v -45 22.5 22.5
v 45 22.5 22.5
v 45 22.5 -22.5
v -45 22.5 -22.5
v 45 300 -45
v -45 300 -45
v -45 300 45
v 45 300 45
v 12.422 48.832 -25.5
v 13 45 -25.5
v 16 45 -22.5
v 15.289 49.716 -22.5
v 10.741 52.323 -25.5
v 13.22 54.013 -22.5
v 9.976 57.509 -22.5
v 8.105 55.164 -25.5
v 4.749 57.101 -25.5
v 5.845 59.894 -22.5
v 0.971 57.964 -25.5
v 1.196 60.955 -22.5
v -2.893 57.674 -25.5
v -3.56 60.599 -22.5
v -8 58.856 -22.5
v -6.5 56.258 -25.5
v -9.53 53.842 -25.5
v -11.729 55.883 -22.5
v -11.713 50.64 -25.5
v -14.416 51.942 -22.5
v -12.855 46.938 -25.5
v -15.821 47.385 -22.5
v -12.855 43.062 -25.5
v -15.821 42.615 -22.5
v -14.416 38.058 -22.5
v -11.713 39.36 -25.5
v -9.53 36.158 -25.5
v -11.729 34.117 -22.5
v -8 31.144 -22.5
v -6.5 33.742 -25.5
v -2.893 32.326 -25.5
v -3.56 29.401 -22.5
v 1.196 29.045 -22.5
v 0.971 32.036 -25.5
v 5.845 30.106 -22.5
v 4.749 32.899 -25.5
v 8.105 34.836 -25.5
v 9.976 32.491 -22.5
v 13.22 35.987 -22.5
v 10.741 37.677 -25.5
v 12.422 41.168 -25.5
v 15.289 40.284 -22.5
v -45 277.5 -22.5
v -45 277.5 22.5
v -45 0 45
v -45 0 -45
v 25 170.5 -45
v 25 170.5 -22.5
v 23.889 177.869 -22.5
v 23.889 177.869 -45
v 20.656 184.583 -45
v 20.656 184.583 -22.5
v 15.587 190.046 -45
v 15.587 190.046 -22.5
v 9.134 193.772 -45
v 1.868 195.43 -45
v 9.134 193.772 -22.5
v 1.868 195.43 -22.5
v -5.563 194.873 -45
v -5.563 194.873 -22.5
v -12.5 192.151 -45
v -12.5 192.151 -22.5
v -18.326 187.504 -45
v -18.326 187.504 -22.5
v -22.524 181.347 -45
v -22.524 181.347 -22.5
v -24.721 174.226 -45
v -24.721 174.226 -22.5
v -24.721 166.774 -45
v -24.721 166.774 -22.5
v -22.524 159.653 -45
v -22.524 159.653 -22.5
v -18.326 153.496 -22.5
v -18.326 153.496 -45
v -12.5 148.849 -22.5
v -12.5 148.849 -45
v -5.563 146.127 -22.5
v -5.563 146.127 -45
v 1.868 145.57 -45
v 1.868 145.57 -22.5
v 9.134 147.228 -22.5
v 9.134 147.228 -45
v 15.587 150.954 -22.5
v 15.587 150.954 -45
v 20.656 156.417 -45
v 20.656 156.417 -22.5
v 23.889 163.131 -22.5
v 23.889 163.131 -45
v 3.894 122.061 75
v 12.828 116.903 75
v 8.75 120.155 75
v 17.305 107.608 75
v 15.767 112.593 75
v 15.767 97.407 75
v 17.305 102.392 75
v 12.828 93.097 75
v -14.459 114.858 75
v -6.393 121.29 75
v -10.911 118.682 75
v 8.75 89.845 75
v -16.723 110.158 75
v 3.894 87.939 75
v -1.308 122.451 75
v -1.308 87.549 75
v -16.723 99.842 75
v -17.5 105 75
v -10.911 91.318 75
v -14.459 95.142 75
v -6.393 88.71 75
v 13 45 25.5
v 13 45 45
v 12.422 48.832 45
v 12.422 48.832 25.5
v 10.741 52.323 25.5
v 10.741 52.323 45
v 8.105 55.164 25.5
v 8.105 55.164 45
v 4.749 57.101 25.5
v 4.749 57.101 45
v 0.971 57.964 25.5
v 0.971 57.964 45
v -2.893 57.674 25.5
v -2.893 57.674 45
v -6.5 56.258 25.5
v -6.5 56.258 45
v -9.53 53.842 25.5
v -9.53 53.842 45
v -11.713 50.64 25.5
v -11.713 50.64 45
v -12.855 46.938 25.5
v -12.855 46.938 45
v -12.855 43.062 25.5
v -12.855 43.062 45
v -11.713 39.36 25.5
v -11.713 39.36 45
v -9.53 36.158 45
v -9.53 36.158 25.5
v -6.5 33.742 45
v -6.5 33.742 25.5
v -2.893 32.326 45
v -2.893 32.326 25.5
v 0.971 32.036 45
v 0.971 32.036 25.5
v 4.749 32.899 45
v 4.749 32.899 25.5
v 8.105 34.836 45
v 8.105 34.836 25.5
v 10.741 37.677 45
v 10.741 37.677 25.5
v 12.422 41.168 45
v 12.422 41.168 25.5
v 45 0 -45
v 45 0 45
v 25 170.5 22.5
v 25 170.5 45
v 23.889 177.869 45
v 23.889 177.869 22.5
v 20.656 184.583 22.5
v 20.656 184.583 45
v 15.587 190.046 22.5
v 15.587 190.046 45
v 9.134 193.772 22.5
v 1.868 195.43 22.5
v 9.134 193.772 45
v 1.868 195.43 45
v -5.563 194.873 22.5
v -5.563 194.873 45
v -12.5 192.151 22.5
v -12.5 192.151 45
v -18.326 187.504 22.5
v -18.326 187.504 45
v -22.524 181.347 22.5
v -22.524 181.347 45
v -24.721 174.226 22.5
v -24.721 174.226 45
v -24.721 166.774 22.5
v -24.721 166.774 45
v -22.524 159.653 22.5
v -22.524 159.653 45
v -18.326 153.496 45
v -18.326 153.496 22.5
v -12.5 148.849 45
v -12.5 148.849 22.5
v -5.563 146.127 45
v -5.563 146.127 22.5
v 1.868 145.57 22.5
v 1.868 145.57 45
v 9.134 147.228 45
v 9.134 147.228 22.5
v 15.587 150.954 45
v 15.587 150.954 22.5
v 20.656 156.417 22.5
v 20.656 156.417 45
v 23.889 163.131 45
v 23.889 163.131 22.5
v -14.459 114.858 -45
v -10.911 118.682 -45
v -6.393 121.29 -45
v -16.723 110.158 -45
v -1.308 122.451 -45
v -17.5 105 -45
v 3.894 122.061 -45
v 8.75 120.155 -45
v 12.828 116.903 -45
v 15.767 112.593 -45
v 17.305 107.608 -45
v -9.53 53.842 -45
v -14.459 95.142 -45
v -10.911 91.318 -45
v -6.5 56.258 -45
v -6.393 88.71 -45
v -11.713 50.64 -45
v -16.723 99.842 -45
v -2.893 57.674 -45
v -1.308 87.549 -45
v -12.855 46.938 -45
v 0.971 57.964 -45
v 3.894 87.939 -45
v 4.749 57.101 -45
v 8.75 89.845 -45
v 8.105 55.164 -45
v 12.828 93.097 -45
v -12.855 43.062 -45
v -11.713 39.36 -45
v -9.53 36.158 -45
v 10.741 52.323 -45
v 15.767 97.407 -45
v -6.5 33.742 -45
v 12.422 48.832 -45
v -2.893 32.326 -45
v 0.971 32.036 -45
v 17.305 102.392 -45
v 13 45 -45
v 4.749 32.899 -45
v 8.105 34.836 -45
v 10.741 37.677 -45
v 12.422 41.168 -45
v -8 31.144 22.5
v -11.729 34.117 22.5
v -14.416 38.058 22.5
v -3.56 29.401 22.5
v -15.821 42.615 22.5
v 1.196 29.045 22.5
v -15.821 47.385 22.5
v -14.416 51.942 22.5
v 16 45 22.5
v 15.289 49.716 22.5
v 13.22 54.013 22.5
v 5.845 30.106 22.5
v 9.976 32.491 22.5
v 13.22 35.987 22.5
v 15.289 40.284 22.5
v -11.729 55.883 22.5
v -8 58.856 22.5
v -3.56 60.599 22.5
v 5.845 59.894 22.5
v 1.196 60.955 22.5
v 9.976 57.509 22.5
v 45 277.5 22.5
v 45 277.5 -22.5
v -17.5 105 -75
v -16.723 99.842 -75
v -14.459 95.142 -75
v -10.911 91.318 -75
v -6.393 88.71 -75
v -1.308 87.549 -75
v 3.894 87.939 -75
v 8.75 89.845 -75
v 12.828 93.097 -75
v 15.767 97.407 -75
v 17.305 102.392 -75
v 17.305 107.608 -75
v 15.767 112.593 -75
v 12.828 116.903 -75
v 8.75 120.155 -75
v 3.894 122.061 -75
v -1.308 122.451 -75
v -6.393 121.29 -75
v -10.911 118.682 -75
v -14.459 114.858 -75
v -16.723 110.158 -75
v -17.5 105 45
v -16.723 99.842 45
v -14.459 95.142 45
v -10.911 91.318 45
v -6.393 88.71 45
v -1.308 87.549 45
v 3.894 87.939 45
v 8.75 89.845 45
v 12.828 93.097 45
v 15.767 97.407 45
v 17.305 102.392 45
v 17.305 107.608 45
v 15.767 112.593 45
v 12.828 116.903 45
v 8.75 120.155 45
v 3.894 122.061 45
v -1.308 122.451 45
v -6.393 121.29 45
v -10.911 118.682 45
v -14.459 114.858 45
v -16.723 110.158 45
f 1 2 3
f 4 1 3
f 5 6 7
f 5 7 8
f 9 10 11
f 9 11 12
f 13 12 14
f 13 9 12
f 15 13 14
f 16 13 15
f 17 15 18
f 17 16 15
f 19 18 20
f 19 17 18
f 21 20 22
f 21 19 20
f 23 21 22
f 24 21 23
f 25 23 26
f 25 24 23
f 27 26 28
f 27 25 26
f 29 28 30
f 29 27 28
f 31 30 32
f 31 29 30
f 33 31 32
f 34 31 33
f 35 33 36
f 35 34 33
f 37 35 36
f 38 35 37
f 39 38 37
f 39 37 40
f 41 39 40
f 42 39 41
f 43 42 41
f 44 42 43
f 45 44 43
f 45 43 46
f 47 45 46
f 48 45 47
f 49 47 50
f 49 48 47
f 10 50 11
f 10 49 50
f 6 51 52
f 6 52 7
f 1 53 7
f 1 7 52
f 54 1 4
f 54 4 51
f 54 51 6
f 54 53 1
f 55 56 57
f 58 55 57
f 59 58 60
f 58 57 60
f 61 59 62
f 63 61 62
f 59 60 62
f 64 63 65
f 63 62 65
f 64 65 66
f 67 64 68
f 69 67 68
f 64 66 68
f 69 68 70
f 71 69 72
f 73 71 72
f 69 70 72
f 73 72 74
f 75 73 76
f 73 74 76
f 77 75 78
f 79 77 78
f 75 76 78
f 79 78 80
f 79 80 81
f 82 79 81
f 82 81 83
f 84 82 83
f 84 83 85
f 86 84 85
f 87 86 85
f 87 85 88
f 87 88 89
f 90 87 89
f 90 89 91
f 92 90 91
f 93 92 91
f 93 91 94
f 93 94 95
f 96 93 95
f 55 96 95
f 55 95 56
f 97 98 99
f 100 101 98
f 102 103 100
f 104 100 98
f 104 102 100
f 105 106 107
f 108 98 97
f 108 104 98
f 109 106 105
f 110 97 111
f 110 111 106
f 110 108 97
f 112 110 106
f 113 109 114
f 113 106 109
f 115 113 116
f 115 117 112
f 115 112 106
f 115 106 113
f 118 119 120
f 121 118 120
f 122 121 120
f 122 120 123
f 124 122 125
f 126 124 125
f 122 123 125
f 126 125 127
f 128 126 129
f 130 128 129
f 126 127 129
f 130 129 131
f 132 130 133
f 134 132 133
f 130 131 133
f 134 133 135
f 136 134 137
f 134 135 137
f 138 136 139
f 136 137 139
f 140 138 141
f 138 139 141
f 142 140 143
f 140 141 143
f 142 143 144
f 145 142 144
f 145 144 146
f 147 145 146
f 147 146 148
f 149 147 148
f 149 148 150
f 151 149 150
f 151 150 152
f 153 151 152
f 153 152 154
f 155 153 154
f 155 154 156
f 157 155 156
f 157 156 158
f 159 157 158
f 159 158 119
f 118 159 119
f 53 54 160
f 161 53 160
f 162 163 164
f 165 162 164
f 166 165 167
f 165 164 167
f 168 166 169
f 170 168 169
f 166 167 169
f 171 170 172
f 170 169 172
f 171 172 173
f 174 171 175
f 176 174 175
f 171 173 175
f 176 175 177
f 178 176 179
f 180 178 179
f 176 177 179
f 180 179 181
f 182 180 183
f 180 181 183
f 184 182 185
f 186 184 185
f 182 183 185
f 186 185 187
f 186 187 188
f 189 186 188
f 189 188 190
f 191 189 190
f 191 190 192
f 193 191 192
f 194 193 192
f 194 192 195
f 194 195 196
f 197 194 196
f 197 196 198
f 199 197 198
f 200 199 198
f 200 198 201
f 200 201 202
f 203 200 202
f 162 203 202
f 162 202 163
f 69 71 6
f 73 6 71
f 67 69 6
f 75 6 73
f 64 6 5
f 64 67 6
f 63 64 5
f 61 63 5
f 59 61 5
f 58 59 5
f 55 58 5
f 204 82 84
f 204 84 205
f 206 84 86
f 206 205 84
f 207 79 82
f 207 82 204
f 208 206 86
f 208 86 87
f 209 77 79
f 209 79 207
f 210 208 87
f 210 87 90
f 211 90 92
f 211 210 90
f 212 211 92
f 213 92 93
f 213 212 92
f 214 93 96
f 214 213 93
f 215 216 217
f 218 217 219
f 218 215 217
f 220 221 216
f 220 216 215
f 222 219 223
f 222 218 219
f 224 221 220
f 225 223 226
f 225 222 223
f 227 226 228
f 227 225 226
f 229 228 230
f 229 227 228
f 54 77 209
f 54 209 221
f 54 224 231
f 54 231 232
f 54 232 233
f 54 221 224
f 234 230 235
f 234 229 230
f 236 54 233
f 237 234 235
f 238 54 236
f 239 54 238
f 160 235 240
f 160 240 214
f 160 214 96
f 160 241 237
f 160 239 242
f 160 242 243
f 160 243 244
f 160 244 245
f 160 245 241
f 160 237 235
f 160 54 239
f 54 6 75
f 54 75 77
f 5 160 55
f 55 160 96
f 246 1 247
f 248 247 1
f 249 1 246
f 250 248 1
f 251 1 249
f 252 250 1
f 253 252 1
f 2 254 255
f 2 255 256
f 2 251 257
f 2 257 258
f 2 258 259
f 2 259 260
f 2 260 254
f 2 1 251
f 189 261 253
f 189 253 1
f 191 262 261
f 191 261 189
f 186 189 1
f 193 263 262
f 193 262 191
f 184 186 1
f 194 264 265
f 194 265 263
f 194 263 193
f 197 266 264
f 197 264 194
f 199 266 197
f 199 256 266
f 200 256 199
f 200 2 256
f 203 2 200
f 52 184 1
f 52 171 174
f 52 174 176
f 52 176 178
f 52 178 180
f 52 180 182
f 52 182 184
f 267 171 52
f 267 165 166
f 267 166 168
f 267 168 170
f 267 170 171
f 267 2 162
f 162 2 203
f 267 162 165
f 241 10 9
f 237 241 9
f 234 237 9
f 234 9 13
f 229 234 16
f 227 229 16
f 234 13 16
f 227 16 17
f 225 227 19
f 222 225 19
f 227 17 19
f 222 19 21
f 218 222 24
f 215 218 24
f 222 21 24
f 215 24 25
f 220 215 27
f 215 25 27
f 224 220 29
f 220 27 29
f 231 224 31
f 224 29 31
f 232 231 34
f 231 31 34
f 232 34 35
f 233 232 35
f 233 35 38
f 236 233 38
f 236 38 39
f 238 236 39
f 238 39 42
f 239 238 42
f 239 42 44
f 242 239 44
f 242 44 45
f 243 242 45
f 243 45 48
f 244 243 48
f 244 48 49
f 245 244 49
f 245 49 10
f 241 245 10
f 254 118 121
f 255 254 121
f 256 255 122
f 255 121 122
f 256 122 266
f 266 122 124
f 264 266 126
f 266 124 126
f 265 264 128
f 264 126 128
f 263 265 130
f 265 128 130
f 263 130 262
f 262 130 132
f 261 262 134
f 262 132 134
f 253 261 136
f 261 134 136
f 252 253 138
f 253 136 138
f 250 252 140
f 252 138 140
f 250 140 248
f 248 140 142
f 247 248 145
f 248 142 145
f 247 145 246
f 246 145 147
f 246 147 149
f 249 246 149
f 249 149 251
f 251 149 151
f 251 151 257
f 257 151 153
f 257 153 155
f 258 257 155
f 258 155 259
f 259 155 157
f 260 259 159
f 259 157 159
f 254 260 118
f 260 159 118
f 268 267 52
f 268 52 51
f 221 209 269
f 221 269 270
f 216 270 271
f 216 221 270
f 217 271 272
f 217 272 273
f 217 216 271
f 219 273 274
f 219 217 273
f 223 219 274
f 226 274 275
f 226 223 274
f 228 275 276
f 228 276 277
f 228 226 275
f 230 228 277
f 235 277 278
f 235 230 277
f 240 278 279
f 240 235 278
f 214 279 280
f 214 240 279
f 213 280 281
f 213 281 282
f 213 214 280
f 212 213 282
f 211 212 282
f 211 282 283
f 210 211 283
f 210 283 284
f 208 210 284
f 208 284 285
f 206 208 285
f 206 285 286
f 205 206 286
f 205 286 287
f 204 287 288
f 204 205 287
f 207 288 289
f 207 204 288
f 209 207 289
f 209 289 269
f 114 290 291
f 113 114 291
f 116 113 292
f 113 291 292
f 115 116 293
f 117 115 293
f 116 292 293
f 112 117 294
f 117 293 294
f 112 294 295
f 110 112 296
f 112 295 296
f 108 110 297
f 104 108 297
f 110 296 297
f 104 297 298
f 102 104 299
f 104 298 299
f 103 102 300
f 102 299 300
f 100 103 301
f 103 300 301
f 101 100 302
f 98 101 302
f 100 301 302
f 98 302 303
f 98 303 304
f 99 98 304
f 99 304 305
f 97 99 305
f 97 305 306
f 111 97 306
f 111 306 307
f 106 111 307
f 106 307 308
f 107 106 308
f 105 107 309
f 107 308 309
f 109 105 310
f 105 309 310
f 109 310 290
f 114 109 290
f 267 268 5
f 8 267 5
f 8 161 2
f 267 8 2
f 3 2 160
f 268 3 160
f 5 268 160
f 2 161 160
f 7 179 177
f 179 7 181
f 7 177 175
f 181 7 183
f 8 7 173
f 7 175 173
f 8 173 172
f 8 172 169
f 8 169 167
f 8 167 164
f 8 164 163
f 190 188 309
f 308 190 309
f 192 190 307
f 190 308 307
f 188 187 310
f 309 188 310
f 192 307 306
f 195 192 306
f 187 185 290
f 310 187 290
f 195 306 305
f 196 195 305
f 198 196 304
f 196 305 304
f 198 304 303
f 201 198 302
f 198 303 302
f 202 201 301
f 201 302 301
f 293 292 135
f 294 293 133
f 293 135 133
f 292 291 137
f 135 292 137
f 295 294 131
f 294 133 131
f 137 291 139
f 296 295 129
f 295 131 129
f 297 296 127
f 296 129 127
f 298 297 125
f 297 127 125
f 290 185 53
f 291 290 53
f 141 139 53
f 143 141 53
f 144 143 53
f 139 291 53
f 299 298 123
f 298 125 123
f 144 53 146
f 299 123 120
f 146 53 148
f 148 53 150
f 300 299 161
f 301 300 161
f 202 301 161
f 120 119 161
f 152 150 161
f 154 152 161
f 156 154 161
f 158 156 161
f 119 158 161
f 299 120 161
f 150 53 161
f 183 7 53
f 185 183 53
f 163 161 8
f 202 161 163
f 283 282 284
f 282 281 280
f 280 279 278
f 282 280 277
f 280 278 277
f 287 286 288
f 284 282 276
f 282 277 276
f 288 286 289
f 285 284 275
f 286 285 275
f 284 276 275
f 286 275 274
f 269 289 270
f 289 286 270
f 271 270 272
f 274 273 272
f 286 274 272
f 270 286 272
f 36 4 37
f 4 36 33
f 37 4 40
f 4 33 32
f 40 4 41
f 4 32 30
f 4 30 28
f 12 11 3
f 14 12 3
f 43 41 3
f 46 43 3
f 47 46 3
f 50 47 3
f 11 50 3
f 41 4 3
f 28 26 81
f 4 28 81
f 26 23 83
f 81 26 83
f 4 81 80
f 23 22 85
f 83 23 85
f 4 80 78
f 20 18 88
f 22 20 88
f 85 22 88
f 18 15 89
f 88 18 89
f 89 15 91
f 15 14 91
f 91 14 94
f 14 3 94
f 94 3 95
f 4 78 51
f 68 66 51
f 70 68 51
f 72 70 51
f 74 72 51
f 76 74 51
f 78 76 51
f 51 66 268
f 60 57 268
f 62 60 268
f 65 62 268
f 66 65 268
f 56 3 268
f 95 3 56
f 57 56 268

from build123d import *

# Parameters (mm, degrees)
SKETCH2_W              = 90
SKETCH2_H              = 90
BOSS_EXTRUDE1_DEPTH    = 300
SKETCH3_W              = 45
SKETCH3_H              = 255
CUT_EXTRUDE1_DEPTH     = 317.425346646
SKETCH4_R              = 25
CRANK_SHAFT_HOLE_DEPTH = 90
SKETCH5_R              = 13
CUT_EXTRUDE3_DEPTH     = 90
CHAMFER1_SIZE          = 3
SKETCH6_R              = 17.5
BOSS_EXTRUDE2_DEPTH    = 30


with BuildPart() as part:
    # Sketch2 → Boss-Extrude1 (new body)
    with BuildSketch(Plane(origin=(0, 0, 0), x_dir=(1, 0, 0), z_dir=(0, 1, 0))):
        Rectangle(SKETCH2_W, SKETCH2_H)
    extrude(amount=BOSS_EXTRUDE1_DEPTH)

    # Sketch3 → Cut-Extrude1 (cut, through all)
    with BuildSketch(Plane(origin=(45, 0, 0), x_dir=(0, 0, -1), z_dir=(1, 0, 0))):
        with Locations((0, 150)):
            Rectangle(SKETCH3_W, SKETCH3_H)
    extrude(amount=-CUT_EXTRUDE1_DEPTH, mode=Mode.SUBTRACT)

    # Sketch4 → Crank shaft hole (cut)
    with BuildSketch(Plane.XY.offset(45)):
        with Locations((0, 170.5)):
            Circle(SKETCH4_R)
    extrude(amount=-CRANK_SHAFT_HOLE_DEPTH, mode=Mode.SUBTRACT)

    # Sketch5 → Cut-Extrude3 (cut)
    with BuildSketch(Plane.XY.offset(45)):
        with Locations((0, 45)):
            Circle(SKETCH5_R)
    extrude(amount=-CUT_EXTRUDE3_DEPTH, mode=Mode.SUBTRACT)

    # Chamfer1
    chamfer1_edges = [part.edges().sort_by_distance(p)[0] for p in [
        (-13, 45, 22.5),
        (-13, 45, -22.5),
    ]]
    chamfer(chamfer1_edges, length=CHAMFER1_SIZE)

    # Sketch6 → Boss-Extrude2 (add)
    with BuildSketch(Plane.XY.offset(45)):
        with Locations(Location((0, 105, 0), (0, 0, 180))):
            Circle(SKETCH6_R)
    boss_extrude2 = extrude(amount=BOSS_EXTRUDE2_DEPTH)

    # Mirror1: Boss-Extrude2 across plane
    add(boss_extrude2.mirror(Plane.XY))


solid = part.part
